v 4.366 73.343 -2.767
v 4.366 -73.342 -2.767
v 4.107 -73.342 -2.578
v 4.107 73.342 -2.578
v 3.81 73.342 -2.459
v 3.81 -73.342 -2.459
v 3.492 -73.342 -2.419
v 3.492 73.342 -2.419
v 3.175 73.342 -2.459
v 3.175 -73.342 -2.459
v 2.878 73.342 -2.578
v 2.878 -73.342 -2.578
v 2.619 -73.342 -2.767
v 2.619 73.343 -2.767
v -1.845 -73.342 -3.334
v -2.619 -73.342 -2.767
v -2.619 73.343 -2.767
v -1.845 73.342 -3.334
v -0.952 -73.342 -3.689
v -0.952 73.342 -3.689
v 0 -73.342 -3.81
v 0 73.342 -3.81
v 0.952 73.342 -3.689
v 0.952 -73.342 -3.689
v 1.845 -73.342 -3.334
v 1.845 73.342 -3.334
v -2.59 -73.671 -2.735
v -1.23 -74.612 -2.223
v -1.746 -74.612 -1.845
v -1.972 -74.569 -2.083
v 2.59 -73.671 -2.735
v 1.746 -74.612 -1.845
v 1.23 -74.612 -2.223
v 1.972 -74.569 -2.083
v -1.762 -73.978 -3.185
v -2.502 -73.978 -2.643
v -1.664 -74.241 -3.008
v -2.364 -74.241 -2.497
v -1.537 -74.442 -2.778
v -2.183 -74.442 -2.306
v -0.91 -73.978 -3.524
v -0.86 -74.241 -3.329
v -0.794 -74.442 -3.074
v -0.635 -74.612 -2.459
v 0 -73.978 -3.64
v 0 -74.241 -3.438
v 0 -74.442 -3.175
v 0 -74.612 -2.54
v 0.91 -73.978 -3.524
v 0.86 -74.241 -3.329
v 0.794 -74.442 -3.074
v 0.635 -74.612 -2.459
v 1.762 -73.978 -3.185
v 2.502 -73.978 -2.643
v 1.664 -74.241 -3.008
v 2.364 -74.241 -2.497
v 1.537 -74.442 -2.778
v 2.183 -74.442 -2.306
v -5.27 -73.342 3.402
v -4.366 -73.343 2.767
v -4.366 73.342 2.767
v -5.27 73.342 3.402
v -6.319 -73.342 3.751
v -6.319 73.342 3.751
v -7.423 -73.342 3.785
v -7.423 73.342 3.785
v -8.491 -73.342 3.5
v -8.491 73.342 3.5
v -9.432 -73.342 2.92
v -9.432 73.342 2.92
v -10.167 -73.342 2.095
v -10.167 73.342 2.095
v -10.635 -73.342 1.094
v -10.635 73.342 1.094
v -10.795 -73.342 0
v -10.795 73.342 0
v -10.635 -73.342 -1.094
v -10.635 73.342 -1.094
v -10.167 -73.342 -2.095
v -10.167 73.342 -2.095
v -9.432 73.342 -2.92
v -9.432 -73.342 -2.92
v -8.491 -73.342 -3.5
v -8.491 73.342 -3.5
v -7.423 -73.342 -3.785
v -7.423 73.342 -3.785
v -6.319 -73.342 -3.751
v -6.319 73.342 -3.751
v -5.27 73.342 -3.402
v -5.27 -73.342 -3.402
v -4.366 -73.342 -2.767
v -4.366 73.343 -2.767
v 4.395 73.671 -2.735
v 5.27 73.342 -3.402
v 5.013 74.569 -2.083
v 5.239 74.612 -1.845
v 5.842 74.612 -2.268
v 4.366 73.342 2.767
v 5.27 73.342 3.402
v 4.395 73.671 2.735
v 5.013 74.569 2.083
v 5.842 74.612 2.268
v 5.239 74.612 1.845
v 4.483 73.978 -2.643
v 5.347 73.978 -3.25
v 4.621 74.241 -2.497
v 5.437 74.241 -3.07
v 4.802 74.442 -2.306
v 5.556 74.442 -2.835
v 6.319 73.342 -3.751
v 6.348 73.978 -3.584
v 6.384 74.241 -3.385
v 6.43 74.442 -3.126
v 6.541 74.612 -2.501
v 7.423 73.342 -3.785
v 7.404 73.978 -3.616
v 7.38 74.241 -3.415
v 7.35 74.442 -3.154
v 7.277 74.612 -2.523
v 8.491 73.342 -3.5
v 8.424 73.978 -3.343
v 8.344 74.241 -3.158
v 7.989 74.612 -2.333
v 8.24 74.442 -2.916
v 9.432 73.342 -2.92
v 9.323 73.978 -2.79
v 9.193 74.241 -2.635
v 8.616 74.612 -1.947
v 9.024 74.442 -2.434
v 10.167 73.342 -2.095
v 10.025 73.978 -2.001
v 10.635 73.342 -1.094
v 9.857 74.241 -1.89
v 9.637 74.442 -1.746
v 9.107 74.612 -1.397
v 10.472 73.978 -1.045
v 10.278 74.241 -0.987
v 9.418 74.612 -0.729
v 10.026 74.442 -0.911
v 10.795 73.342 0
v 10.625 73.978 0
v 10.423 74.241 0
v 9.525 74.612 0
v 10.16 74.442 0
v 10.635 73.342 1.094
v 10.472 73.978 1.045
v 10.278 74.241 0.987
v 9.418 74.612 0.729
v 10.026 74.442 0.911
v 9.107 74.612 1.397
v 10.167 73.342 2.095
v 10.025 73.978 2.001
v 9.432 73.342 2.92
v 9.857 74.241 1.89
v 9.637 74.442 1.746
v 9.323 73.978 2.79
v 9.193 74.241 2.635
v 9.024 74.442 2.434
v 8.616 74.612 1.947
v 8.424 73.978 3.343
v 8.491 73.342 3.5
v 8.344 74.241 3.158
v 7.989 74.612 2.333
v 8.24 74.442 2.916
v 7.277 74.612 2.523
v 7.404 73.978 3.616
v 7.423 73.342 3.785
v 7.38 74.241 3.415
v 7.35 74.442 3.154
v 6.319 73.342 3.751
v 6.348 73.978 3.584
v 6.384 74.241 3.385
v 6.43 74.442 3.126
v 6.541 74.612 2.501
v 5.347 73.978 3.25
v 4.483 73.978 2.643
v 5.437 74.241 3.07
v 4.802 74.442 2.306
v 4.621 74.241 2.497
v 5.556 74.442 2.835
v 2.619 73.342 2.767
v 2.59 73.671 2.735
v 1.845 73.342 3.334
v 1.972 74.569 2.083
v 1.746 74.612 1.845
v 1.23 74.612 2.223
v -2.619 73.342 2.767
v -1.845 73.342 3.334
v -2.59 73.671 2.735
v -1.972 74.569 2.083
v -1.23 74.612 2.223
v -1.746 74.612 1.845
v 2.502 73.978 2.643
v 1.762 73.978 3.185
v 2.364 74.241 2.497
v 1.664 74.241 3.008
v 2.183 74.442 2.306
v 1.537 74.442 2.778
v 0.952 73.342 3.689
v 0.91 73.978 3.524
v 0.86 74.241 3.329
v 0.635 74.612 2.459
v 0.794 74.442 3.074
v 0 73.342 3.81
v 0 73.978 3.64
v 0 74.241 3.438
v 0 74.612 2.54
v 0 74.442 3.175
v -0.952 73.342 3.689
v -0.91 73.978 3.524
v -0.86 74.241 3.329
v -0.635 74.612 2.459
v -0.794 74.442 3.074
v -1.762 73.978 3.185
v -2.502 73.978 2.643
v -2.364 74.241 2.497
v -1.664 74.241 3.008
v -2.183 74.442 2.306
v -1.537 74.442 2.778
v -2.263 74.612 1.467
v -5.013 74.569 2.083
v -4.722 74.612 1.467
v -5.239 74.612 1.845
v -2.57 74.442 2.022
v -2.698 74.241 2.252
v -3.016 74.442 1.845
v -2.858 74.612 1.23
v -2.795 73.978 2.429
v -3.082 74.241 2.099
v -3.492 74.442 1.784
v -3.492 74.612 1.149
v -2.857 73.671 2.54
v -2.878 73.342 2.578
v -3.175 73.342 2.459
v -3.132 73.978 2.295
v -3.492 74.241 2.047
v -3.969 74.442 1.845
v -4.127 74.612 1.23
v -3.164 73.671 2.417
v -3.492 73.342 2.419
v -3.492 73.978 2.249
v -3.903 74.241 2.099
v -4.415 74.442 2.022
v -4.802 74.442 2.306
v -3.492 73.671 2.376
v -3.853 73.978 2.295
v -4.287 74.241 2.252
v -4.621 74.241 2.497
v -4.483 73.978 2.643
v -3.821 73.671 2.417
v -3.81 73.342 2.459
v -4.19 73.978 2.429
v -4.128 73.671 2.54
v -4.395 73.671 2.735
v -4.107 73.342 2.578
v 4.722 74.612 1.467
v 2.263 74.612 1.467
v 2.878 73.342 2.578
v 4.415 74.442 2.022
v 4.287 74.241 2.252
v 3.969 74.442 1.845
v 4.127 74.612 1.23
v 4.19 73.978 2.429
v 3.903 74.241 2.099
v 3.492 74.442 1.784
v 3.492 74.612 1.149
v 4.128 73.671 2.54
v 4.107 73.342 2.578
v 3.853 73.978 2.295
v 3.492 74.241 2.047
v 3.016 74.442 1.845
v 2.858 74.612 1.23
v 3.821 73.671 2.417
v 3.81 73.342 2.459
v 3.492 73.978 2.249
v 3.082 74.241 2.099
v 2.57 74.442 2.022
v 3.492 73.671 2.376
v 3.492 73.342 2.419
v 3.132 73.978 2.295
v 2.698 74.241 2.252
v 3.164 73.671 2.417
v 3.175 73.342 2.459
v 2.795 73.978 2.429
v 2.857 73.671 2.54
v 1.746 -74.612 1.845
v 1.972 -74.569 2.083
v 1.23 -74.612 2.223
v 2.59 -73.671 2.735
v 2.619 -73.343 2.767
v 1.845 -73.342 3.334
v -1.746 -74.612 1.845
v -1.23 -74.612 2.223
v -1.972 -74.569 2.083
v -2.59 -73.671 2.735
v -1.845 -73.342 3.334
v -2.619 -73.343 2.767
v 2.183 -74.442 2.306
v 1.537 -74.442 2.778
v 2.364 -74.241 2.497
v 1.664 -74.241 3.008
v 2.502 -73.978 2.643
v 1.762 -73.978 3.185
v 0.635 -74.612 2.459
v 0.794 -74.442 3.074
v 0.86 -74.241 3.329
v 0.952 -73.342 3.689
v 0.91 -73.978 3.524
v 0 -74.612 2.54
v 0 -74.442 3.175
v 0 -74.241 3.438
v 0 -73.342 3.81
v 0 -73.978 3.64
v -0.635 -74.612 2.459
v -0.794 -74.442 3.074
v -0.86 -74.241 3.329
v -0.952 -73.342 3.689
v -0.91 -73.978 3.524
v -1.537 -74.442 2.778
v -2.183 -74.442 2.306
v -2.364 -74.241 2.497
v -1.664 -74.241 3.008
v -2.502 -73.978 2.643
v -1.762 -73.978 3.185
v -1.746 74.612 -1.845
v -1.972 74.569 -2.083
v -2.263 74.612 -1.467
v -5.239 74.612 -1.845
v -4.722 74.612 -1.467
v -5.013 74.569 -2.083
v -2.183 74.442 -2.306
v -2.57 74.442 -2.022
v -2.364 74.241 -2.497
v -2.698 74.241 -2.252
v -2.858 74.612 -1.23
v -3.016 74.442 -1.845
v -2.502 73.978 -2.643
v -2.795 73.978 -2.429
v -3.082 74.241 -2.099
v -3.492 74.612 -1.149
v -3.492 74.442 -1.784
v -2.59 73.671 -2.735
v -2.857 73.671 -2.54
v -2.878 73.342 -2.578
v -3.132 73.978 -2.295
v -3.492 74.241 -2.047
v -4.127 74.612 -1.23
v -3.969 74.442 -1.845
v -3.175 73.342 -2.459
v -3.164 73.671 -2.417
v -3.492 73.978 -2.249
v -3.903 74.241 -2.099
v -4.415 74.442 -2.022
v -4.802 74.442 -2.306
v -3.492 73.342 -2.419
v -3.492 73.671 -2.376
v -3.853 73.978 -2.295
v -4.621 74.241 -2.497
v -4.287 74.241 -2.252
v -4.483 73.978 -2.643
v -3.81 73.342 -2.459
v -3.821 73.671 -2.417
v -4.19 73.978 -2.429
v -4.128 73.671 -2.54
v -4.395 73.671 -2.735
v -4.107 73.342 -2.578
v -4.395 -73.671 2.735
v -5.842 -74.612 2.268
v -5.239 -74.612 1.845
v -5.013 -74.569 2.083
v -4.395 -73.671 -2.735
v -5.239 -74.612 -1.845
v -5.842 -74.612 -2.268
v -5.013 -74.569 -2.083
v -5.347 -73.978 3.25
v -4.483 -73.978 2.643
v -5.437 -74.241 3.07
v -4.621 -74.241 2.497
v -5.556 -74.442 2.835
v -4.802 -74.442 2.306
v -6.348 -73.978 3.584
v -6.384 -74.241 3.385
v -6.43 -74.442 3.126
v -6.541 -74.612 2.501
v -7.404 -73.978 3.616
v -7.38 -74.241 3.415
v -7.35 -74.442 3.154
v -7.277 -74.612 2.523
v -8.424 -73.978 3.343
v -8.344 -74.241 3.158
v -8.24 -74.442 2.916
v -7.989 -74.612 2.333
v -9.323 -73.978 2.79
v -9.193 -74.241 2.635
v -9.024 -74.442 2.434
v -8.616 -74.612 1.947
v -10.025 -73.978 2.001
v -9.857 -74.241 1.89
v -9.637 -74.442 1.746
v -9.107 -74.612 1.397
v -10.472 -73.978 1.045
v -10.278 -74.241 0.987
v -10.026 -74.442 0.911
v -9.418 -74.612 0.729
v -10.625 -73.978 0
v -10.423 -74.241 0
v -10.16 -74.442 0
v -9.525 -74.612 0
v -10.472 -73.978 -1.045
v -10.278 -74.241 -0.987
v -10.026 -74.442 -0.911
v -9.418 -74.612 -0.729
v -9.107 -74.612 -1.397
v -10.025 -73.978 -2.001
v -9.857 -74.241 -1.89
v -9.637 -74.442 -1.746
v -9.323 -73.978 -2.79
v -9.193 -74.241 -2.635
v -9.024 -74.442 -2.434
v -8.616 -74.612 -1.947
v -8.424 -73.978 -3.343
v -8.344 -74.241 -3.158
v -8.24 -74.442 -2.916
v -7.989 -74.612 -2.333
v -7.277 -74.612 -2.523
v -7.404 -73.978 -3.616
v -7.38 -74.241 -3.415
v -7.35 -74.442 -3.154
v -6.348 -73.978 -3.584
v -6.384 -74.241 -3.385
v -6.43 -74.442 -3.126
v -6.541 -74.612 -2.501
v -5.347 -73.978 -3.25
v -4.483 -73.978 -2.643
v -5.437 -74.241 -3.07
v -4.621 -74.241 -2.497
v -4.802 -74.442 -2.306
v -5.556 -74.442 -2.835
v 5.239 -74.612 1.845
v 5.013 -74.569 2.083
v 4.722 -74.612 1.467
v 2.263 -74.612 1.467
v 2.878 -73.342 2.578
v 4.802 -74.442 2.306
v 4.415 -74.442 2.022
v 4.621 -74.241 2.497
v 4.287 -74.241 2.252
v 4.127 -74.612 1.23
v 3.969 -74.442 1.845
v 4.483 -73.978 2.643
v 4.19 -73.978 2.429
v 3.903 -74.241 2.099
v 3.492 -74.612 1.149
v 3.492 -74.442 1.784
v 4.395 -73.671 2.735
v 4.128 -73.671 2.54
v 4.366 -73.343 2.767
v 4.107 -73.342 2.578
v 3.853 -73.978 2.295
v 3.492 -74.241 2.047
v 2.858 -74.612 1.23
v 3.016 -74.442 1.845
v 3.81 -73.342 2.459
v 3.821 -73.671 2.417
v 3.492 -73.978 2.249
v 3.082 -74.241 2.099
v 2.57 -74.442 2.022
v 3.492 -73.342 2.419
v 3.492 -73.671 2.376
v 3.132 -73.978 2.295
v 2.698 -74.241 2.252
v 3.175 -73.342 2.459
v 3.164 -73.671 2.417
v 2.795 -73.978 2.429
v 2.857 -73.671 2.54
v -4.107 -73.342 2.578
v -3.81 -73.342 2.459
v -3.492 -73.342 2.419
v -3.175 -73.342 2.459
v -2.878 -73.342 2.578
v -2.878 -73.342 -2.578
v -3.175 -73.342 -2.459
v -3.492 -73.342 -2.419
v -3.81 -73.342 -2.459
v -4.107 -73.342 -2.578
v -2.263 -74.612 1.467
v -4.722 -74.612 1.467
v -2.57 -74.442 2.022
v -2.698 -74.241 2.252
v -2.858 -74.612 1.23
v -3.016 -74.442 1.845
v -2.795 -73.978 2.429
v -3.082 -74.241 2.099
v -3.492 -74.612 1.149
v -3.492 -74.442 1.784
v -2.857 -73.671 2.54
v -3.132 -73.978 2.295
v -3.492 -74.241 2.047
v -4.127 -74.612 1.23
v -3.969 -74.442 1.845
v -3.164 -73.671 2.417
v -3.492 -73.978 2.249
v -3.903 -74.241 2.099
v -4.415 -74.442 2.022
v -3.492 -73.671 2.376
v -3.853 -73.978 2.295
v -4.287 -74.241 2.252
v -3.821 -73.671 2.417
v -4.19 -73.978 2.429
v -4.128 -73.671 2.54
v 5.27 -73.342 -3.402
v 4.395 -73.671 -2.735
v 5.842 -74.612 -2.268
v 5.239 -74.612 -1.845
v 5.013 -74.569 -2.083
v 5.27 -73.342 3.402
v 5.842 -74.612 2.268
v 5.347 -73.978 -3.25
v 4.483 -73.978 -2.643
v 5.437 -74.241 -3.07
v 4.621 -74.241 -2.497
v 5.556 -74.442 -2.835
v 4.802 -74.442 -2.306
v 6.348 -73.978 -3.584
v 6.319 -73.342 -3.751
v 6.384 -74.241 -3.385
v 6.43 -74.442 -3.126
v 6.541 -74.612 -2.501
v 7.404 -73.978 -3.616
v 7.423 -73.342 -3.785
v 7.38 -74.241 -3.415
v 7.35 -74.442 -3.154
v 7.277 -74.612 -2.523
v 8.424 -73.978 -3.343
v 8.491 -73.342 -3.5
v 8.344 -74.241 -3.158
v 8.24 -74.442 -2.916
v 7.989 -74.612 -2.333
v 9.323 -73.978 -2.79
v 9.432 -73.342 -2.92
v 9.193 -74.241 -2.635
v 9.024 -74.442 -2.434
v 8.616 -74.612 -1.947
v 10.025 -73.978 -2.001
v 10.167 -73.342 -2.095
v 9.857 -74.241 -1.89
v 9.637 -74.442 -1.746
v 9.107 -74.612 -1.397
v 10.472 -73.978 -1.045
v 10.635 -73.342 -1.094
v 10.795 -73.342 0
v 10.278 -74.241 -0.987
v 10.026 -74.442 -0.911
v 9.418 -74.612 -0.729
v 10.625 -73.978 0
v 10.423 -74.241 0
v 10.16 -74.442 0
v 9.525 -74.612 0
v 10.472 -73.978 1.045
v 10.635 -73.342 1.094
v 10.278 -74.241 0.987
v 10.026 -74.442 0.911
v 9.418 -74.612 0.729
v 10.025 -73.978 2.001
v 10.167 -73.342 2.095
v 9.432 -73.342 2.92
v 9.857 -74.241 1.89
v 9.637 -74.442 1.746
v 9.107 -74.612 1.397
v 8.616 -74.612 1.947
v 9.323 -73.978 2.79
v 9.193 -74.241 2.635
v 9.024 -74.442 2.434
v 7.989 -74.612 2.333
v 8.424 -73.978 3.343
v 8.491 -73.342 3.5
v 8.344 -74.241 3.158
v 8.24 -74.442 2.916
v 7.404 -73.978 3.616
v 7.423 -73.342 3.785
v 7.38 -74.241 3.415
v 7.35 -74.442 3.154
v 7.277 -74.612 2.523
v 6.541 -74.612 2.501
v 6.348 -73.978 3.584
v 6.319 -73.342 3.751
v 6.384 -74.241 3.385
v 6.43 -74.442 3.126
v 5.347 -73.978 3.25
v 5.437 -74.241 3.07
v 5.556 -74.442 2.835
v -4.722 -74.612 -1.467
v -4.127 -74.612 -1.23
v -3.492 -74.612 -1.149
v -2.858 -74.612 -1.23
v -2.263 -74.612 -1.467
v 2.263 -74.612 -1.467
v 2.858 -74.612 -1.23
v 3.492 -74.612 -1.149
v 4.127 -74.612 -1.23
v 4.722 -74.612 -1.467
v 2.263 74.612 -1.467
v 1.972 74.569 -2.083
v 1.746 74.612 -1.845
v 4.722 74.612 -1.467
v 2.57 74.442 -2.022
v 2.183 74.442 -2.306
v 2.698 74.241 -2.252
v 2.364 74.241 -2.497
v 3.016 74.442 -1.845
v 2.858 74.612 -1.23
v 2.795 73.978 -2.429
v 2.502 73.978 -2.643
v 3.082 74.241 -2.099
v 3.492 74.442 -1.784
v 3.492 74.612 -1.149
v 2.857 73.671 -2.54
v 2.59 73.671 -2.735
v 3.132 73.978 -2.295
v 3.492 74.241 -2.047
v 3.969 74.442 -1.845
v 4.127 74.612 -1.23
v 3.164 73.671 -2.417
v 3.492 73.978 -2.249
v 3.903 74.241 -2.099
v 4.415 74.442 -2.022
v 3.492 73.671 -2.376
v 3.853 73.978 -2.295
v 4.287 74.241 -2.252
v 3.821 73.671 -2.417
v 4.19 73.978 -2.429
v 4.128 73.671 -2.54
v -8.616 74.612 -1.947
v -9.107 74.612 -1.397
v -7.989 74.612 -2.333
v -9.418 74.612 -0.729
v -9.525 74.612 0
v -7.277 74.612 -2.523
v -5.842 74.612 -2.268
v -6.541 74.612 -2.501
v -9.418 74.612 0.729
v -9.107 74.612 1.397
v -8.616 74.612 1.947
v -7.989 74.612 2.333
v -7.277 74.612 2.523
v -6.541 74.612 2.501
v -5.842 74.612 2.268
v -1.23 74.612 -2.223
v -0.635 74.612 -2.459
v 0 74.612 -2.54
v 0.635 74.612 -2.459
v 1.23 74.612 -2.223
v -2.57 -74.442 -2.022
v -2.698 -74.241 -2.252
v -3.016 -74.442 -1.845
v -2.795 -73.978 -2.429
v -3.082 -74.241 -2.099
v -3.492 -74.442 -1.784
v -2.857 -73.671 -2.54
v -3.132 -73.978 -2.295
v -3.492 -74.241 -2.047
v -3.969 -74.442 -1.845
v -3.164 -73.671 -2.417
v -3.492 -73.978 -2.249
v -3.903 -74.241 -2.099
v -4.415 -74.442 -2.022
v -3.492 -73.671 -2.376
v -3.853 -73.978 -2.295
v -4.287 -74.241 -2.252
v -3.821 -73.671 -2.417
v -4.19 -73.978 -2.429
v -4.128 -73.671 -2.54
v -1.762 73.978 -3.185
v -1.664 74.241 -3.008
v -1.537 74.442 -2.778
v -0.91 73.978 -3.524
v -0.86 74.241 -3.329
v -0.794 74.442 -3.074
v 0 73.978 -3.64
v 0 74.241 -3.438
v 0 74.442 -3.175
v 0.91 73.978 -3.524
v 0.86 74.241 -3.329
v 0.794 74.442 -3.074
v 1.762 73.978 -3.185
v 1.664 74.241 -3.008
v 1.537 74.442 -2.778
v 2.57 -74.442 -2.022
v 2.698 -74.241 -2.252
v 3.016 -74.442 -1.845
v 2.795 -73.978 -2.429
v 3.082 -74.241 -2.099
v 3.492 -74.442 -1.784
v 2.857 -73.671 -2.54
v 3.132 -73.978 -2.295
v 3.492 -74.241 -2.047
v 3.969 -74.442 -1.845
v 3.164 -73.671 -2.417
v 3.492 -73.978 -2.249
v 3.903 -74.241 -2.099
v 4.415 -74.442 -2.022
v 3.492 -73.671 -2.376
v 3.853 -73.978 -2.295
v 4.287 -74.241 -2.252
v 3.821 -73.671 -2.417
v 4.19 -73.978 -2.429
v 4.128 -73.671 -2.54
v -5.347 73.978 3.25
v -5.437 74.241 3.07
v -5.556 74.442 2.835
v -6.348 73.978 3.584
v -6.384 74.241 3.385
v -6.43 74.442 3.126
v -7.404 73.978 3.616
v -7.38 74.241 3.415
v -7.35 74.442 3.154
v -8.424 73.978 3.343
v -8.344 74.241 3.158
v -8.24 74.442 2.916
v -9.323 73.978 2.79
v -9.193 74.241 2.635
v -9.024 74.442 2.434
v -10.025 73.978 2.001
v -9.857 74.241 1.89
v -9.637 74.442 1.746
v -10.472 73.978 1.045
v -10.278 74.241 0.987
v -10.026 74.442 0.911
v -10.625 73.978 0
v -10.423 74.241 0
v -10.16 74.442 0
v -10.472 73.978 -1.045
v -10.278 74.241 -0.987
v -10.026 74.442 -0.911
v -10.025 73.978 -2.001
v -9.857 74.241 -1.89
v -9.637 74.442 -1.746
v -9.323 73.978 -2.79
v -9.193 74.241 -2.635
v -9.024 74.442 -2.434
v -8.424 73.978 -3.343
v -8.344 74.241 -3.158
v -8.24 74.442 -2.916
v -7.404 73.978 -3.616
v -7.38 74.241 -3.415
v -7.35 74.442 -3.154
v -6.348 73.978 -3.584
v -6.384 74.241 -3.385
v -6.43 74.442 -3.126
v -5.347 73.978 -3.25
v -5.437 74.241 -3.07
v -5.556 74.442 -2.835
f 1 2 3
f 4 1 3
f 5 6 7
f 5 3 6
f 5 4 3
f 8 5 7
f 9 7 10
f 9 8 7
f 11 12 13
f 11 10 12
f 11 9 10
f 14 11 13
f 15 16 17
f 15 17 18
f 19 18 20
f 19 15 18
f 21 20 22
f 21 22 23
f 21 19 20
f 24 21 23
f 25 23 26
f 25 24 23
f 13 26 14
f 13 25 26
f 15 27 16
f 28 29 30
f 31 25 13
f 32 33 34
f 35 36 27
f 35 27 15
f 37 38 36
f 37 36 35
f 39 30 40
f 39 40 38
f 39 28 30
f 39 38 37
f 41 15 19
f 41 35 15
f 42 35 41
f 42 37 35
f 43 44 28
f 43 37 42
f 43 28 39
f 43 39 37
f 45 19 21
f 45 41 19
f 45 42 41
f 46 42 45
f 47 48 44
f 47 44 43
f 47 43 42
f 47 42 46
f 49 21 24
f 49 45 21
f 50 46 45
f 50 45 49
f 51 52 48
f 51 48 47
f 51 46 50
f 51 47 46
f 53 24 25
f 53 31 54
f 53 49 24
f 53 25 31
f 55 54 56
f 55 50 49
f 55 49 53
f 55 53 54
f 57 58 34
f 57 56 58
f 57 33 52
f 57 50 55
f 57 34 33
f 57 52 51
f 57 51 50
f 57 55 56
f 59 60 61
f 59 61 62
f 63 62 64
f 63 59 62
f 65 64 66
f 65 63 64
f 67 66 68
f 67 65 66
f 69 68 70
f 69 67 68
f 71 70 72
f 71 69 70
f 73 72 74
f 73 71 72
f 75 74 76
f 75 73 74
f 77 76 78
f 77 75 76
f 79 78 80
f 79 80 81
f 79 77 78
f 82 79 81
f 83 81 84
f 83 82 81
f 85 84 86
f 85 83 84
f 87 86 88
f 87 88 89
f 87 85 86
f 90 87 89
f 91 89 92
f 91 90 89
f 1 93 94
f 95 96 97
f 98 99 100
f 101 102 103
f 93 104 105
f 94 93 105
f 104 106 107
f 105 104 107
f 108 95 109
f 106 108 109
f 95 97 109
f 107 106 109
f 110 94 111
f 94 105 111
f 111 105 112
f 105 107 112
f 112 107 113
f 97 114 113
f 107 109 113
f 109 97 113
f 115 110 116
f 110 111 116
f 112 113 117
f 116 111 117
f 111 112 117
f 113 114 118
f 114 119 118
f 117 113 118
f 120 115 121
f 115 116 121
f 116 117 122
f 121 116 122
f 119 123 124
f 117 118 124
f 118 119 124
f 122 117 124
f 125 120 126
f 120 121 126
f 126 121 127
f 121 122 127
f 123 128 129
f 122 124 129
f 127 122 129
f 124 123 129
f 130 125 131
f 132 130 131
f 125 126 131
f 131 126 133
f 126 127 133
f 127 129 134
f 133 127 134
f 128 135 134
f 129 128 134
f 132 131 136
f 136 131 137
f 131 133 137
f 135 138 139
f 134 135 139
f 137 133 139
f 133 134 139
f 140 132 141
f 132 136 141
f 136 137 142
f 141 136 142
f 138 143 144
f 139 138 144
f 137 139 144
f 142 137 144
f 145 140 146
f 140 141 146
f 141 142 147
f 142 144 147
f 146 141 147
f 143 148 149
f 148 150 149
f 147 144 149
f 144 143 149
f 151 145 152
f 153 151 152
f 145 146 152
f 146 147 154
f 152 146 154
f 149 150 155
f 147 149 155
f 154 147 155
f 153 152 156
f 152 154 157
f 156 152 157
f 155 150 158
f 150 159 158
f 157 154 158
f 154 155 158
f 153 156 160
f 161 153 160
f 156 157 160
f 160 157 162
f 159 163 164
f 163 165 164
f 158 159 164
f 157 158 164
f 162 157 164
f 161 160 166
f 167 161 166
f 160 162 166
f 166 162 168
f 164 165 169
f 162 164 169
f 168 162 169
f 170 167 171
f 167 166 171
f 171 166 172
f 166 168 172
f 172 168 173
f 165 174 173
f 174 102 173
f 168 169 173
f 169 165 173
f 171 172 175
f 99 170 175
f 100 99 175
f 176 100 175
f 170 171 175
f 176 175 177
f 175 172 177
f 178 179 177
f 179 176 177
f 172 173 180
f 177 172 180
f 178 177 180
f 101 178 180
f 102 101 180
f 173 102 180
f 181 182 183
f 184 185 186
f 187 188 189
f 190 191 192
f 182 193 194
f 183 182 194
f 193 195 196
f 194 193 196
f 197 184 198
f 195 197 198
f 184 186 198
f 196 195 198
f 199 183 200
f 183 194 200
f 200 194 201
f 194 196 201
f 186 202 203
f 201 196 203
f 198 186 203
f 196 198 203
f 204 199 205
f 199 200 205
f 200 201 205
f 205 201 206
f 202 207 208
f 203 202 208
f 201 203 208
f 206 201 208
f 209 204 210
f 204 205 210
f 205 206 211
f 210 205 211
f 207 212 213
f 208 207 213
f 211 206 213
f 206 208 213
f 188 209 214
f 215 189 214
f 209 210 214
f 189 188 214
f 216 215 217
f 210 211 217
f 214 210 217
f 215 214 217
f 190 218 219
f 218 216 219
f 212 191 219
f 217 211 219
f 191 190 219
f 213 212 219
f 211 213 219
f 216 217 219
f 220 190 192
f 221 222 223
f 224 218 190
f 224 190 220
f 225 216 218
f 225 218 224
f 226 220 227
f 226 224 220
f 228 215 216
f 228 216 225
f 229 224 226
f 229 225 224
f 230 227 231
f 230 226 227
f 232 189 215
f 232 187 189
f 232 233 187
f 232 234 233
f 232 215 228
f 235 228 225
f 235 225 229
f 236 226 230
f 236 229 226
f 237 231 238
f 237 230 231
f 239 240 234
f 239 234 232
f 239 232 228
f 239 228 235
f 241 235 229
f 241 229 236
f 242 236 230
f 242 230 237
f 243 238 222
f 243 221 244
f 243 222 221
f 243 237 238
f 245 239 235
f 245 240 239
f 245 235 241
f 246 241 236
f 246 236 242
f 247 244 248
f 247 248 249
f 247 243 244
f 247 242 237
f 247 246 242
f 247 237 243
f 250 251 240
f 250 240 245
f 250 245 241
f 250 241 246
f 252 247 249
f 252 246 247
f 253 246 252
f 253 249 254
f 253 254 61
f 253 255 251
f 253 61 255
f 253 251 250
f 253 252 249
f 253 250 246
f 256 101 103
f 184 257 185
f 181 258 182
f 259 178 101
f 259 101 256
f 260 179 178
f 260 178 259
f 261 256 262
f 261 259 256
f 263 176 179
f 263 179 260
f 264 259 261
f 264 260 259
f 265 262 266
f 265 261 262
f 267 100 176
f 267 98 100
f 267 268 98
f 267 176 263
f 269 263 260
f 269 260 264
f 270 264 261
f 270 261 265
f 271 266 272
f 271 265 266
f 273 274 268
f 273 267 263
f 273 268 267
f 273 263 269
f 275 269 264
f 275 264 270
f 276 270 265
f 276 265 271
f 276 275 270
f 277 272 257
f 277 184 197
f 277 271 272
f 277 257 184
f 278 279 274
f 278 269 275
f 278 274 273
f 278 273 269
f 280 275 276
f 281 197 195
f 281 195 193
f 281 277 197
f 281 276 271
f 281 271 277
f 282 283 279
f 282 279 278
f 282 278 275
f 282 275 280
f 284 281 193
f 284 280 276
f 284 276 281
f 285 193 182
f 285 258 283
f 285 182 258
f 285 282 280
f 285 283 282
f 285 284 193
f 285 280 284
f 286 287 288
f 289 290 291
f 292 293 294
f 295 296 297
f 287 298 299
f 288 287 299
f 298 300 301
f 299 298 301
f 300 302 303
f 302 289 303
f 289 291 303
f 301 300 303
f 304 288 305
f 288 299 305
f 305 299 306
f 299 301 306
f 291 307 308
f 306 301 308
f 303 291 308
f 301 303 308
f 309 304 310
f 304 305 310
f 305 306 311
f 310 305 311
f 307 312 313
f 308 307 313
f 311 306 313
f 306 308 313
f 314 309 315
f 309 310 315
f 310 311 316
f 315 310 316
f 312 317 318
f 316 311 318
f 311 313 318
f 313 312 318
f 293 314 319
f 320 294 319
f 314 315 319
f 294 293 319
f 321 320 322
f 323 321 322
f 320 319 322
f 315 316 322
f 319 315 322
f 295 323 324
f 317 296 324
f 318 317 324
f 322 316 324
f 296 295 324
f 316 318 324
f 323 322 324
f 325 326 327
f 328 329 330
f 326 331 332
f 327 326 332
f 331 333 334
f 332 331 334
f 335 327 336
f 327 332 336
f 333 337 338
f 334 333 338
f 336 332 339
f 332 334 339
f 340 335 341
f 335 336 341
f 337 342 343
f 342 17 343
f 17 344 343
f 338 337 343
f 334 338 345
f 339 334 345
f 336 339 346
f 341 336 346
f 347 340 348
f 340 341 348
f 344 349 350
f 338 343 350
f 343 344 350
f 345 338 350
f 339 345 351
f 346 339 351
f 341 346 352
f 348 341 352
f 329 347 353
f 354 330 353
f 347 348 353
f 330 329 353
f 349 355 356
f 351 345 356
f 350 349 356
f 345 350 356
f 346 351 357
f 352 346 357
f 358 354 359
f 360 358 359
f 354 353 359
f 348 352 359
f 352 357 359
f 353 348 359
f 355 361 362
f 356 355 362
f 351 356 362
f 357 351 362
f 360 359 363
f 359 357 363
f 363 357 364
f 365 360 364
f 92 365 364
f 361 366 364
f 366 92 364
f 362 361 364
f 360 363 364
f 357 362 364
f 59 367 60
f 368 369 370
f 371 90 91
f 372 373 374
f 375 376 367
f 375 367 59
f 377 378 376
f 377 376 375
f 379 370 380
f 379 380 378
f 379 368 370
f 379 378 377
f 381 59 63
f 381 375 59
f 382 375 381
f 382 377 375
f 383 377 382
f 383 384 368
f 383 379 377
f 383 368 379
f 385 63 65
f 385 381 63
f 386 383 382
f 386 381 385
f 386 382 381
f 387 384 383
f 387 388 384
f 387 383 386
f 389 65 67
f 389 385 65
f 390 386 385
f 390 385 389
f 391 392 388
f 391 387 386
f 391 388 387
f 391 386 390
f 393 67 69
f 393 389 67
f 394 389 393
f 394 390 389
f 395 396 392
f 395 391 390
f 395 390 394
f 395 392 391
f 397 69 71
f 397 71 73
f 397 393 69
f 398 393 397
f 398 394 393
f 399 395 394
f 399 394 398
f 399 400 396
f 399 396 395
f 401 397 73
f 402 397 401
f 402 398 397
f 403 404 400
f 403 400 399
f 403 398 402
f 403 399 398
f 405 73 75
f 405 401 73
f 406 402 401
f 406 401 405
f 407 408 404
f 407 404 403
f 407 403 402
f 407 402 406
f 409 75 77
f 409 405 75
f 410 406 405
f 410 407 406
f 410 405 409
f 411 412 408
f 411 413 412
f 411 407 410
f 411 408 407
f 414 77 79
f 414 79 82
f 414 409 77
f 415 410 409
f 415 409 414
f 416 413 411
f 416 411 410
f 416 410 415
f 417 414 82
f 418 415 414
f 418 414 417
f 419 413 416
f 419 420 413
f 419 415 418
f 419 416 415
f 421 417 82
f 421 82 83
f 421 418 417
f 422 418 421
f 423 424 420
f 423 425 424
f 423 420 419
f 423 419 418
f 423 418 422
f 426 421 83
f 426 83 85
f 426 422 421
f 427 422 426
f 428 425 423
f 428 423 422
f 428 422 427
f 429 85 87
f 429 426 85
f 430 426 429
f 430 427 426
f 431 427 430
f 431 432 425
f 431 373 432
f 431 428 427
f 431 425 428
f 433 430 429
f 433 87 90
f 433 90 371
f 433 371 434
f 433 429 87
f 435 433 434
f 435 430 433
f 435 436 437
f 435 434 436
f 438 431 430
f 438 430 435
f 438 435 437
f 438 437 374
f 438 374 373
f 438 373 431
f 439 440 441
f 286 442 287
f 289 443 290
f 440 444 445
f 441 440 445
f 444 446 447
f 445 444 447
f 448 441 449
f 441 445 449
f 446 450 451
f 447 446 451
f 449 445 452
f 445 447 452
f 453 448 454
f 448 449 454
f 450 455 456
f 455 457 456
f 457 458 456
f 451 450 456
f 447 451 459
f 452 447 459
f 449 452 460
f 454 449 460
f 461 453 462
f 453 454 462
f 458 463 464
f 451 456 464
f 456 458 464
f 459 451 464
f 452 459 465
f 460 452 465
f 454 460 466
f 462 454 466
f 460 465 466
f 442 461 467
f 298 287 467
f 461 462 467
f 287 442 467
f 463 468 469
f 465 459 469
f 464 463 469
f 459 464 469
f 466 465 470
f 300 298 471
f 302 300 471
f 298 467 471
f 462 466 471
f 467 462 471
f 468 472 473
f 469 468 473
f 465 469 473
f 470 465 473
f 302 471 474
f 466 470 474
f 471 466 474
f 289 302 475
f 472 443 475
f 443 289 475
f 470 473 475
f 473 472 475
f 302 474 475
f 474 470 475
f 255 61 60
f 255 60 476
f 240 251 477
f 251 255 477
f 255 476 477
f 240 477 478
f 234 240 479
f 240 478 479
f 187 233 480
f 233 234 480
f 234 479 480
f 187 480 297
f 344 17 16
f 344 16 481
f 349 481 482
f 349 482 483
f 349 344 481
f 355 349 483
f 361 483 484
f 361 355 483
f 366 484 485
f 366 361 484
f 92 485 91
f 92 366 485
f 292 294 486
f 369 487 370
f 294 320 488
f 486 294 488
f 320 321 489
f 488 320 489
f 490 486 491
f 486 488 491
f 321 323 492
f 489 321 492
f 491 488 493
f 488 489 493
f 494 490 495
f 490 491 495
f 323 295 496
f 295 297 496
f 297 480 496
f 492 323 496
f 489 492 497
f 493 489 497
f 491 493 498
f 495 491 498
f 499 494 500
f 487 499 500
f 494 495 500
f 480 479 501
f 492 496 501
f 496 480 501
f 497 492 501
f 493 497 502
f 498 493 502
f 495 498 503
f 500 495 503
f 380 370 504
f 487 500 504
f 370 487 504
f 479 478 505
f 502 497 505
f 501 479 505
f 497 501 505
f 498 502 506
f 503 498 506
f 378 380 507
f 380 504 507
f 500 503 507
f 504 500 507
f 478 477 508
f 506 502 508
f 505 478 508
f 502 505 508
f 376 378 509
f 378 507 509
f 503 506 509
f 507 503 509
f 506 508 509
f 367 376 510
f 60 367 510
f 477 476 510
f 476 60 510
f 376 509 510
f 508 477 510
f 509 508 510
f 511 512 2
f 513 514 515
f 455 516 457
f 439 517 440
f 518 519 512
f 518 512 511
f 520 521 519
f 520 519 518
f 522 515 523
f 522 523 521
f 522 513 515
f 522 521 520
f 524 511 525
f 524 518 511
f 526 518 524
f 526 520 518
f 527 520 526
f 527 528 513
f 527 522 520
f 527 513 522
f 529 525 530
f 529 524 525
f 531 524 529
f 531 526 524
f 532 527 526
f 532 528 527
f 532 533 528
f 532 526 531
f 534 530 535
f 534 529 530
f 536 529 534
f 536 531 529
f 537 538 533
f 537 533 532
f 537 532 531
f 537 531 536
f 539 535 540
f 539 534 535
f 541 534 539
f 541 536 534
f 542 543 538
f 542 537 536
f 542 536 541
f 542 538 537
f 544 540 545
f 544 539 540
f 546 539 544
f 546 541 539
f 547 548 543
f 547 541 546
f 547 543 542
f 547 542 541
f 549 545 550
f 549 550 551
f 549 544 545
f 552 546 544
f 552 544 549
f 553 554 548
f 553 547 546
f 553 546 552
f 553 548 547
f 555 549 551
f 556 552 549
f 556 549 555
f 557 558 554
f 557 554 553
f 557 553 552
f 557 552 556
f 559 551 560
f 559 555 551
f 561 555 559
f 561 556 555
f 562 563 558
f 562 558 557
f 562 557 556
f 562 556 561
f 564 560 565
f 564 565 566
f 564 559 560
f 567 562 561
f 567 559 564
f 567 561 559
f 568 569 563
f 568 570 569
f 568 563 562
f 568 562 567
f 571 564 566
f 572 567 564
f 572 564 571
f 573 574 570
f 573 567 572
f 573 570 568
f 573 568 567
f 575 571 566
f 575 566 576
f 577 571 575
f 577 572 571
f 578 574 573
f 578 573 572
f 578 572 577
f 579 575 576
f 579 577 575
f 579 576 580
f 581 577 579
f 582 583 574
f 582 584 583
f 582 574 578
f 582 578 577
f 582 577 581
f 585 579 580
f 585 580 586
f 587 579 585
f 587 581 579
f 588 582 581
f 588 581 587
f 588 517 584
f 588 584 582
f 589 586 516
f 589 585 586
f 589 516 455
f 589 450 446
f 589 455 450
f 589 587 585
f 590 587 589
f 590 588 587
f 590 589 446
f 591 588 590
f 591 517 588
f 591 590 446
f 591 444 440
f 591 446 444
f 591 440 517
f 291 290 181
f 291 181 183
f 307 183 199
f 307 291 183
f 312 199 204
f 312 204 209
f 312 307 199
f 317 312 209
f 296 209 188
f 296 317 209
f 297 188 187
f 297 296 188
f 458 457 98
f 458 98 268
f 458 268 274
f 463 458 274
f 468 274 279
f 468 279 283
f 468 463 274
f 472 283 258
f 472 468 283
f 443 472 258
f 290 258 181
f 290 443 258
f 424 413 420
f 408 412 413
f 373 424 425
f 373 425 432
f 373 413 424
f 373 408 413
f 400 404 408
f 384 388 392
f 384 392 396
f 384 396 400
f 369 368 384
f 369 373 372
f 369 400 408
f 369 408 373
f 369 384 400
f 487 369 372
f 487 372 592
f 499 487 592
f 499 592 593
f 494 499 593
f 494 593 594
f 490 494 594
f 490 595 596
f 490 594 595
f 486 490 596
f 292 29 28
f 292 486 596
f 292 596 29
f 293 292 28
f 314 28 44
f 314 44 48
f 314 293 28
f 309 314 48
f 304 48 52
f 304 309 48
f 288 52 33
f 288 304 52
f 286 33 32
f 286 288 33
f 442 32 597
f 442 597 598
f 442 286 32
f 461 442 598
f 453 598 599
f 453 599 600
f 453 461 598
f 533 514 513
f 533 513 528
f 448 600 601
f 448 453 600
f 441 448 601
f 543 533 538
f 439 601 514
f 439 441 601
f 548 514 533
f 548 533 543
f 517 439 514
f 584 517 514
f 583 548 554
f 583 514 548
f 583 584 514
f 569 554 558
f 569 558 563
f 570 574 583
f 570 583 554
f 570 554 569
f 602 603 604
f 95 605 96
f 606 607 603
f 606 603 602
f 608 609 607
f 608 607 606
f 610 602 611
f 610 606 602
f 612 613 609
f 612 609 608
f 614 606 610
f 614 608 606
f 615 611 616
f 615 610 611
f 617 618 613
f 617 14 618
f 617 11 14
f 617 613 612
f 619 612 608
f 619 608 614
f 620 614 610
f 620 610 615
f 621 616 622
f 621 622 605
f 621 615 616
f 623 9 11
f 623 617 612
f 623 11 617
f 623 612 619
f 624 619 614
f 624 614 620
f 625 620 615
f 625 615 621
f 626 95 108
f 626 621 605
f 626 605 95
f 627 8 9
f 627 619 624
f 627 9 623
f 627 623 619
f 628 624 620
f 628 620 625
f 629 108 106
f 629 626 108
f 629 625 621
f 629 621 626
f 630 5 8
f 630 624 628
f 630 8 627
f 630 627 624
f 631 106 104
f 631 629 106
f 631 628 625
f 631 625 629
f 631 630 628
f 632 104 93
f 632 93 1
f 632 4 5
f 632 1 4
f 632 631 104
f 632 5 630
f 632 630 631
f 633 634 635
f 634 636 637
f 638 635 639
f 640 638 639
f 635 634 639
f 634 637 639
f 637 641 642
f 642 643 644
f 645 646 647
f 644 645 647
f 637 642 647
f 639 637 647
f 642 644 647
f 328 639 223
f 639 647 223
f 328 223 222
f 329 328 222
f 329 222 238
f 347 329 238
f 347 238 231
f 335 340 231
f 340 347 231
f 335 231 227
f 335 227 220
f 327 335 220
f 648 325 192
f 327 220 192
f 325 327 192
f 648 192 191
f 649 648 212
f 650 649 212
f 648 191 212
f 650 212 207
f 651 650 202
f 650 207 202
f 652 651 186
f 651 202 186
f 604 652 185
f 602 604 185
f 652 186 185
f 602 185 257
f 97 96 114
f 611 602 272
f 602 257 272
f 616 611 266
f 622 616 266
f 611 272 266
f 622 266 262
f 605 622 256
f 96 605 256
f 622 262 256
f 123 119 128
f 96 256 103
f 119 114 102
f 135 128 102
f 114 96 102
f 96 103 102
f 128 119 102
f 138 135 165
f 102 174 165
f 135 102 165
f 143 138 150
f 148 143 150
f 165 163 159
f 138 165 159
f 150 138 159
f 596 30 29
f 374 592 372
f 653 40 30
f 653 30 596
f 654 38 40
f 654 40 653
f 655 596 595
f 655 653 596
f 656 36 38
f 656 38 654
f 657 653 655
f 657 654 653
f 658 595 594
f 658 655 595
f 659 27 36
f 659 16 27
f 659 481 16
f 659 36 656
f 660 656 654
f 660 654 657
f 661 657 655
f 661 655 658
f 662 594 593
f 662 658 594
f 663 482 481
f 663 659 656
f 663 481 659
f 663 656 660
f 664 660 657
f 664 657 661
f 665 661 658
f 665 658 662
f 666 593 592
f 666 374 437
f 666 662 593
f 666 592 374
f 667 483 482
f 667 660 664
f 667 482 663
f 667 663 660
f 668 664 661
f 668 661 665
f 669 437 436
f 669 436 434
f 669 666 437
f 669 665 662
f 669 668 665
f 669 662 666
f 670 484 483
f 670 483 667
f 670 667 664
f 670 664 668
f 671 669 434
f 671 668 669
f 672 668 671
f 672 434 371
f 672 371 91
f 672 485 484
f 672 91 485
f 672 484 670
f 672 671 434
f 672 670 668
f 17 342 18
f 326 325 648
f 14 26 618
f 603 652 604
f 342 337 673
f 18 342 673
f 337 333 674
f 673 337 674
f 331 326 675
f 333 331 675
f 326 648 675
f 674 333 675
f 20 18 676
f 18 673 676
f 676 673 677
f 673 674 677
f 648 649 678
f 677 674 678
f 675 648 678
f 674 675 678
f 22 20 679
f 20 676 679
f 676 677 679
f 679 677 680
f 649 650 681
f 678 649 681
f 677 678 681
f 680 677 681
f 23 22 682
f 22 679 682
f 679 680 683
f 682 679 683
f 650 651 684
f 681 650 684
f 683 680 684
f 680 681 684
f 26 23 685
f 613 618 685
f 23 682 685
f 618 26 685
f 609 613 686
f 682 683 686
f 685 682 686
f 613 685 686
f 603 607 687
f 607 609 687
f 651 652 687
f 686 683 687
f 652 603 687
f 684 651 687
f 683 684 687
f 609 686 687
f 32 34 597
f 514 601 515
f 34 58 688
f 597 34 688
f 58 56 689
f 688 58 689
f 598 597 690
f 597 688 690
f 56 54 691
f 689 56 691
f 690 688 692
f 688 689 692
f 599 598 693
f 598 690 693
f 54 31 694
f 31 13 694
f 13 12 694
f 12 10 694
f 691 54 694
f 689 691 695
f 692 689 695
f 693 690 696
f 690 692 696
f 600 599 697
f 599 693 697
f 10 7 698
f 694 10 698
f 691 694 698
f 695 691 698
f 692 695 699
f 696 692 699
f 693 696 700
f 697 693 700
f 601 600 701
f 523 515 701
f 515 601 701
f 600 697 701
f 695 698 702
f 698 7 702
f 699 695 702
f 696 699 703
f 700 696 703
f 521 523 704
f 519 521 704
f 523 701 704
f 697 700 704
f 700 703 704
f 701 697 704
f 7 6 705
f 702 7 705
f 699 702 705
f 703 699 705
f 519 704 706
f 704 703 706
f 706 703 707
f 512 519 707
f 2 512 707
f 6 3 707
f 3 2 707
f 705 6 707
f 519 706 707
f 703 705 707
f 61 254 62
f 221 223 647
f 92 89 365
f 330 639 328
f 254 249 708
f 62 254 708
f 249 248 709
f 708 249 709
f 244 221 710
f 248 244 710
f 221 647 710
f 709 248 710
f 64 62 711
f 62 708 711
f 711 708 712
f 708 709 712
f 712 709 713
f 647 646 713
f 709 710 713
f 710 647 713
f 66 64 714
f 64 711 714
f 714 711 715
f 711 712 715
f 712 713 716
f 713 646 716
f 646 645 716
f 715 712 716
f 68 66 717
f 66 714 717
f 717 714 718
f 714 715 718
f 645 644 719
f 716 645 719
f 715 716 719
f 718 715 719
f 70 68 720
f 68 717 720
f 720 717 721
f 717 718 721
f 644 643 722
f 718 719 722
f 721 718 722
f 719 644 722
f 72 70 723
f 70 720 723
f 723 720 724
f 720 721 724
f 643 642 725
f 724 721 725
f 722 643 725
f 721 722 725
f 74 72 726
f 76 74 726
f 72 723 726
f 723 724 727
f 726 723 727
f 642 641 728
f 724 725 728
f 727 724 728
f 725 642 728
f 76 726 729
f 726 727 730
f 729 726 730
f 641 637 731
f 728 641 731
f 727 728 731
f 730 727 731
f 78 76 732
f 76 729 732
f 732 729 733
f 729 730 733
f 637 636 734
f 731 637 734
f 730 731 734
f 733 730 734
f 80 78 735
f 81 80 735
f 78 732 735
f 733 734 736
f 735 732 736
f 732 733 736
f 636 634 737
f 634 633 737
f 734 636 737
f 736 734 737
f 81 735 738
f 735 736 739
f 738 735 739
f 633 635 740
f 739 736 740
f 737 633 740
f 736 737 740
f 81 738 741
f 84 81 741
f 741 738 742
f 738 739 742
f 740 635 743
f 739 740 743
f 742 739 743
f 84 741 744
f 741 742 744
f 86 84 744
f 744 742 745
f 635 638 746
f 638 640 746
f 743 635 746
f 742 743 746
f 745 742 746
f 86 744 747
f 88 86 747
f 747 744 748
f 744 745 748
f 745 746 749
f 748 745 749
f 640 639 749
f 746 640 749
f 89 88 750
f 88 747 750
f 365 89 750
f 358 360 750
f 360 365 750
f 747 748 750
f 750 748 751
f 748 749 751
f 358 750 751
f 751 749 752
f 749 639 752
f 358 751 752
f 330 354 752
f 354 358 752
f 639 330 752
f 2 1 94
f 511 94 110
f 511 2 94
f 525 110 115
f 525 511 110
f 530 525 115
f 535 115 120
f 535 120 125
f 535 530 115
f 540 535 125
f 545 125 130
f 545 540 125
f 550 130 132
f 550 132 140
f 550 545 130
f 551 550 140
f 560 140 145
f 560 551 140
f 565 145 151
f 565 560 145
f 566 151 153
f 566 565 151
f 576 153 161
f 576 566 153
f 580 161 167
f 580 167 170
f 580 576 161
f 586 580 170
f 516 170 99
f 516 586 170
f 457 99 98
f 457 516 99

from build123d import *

# Parameters (mm, degrees)
F1_DEPTH = 74.6125
F2_R     = 1.27


with BuildPart() as f1:
    # F0 (on Front) → F1 (new body, symmetric)
    with BuildSketch(Plane.XZ):
        with BuildLine():
            ThreePointArc((3.4925, -1.522677), (10.795, 0), (3.4925, 1.522677))
            ThreePointArc((3.4925, 1.522677), (0, 3.81), (-3.4925, 1.522677))
            ThreePointArc((-3.4925, 1.522677), (-10.795, 0), (-3.4925, -1.522677))
            ThreePointArc((-3.4925, -1.522677), (0, -3.81), (3.4925, -1.522677))
        make_face()
    extrude(amount=F1_DEPTH, both=True)

    # F2
    f2_edges = [f1.edges().sort_by_distance(p)[0] for p in [
        (-3.4925, 0, 1.522677),
        (3.4925, 0, 1.522677),
        (-3.4925, 0, -1.522677),
        (3.4925, 0, -1.522677),
        (0, 74.6125, -3.81),
        (10.795, 74.6125, 0),
        (0, 74.6125, 3.81),
        (-10.795, 74.6125, 0),
        (0, -74.6125, -3.81),
        (10.795, -74.6125, 0),
        (0, -74.6125, 3.81),
        (-10.795, -74.6125, 0),
    ]]
    fillet(f2_edges, radius=F2_R)


solid = f1.part
